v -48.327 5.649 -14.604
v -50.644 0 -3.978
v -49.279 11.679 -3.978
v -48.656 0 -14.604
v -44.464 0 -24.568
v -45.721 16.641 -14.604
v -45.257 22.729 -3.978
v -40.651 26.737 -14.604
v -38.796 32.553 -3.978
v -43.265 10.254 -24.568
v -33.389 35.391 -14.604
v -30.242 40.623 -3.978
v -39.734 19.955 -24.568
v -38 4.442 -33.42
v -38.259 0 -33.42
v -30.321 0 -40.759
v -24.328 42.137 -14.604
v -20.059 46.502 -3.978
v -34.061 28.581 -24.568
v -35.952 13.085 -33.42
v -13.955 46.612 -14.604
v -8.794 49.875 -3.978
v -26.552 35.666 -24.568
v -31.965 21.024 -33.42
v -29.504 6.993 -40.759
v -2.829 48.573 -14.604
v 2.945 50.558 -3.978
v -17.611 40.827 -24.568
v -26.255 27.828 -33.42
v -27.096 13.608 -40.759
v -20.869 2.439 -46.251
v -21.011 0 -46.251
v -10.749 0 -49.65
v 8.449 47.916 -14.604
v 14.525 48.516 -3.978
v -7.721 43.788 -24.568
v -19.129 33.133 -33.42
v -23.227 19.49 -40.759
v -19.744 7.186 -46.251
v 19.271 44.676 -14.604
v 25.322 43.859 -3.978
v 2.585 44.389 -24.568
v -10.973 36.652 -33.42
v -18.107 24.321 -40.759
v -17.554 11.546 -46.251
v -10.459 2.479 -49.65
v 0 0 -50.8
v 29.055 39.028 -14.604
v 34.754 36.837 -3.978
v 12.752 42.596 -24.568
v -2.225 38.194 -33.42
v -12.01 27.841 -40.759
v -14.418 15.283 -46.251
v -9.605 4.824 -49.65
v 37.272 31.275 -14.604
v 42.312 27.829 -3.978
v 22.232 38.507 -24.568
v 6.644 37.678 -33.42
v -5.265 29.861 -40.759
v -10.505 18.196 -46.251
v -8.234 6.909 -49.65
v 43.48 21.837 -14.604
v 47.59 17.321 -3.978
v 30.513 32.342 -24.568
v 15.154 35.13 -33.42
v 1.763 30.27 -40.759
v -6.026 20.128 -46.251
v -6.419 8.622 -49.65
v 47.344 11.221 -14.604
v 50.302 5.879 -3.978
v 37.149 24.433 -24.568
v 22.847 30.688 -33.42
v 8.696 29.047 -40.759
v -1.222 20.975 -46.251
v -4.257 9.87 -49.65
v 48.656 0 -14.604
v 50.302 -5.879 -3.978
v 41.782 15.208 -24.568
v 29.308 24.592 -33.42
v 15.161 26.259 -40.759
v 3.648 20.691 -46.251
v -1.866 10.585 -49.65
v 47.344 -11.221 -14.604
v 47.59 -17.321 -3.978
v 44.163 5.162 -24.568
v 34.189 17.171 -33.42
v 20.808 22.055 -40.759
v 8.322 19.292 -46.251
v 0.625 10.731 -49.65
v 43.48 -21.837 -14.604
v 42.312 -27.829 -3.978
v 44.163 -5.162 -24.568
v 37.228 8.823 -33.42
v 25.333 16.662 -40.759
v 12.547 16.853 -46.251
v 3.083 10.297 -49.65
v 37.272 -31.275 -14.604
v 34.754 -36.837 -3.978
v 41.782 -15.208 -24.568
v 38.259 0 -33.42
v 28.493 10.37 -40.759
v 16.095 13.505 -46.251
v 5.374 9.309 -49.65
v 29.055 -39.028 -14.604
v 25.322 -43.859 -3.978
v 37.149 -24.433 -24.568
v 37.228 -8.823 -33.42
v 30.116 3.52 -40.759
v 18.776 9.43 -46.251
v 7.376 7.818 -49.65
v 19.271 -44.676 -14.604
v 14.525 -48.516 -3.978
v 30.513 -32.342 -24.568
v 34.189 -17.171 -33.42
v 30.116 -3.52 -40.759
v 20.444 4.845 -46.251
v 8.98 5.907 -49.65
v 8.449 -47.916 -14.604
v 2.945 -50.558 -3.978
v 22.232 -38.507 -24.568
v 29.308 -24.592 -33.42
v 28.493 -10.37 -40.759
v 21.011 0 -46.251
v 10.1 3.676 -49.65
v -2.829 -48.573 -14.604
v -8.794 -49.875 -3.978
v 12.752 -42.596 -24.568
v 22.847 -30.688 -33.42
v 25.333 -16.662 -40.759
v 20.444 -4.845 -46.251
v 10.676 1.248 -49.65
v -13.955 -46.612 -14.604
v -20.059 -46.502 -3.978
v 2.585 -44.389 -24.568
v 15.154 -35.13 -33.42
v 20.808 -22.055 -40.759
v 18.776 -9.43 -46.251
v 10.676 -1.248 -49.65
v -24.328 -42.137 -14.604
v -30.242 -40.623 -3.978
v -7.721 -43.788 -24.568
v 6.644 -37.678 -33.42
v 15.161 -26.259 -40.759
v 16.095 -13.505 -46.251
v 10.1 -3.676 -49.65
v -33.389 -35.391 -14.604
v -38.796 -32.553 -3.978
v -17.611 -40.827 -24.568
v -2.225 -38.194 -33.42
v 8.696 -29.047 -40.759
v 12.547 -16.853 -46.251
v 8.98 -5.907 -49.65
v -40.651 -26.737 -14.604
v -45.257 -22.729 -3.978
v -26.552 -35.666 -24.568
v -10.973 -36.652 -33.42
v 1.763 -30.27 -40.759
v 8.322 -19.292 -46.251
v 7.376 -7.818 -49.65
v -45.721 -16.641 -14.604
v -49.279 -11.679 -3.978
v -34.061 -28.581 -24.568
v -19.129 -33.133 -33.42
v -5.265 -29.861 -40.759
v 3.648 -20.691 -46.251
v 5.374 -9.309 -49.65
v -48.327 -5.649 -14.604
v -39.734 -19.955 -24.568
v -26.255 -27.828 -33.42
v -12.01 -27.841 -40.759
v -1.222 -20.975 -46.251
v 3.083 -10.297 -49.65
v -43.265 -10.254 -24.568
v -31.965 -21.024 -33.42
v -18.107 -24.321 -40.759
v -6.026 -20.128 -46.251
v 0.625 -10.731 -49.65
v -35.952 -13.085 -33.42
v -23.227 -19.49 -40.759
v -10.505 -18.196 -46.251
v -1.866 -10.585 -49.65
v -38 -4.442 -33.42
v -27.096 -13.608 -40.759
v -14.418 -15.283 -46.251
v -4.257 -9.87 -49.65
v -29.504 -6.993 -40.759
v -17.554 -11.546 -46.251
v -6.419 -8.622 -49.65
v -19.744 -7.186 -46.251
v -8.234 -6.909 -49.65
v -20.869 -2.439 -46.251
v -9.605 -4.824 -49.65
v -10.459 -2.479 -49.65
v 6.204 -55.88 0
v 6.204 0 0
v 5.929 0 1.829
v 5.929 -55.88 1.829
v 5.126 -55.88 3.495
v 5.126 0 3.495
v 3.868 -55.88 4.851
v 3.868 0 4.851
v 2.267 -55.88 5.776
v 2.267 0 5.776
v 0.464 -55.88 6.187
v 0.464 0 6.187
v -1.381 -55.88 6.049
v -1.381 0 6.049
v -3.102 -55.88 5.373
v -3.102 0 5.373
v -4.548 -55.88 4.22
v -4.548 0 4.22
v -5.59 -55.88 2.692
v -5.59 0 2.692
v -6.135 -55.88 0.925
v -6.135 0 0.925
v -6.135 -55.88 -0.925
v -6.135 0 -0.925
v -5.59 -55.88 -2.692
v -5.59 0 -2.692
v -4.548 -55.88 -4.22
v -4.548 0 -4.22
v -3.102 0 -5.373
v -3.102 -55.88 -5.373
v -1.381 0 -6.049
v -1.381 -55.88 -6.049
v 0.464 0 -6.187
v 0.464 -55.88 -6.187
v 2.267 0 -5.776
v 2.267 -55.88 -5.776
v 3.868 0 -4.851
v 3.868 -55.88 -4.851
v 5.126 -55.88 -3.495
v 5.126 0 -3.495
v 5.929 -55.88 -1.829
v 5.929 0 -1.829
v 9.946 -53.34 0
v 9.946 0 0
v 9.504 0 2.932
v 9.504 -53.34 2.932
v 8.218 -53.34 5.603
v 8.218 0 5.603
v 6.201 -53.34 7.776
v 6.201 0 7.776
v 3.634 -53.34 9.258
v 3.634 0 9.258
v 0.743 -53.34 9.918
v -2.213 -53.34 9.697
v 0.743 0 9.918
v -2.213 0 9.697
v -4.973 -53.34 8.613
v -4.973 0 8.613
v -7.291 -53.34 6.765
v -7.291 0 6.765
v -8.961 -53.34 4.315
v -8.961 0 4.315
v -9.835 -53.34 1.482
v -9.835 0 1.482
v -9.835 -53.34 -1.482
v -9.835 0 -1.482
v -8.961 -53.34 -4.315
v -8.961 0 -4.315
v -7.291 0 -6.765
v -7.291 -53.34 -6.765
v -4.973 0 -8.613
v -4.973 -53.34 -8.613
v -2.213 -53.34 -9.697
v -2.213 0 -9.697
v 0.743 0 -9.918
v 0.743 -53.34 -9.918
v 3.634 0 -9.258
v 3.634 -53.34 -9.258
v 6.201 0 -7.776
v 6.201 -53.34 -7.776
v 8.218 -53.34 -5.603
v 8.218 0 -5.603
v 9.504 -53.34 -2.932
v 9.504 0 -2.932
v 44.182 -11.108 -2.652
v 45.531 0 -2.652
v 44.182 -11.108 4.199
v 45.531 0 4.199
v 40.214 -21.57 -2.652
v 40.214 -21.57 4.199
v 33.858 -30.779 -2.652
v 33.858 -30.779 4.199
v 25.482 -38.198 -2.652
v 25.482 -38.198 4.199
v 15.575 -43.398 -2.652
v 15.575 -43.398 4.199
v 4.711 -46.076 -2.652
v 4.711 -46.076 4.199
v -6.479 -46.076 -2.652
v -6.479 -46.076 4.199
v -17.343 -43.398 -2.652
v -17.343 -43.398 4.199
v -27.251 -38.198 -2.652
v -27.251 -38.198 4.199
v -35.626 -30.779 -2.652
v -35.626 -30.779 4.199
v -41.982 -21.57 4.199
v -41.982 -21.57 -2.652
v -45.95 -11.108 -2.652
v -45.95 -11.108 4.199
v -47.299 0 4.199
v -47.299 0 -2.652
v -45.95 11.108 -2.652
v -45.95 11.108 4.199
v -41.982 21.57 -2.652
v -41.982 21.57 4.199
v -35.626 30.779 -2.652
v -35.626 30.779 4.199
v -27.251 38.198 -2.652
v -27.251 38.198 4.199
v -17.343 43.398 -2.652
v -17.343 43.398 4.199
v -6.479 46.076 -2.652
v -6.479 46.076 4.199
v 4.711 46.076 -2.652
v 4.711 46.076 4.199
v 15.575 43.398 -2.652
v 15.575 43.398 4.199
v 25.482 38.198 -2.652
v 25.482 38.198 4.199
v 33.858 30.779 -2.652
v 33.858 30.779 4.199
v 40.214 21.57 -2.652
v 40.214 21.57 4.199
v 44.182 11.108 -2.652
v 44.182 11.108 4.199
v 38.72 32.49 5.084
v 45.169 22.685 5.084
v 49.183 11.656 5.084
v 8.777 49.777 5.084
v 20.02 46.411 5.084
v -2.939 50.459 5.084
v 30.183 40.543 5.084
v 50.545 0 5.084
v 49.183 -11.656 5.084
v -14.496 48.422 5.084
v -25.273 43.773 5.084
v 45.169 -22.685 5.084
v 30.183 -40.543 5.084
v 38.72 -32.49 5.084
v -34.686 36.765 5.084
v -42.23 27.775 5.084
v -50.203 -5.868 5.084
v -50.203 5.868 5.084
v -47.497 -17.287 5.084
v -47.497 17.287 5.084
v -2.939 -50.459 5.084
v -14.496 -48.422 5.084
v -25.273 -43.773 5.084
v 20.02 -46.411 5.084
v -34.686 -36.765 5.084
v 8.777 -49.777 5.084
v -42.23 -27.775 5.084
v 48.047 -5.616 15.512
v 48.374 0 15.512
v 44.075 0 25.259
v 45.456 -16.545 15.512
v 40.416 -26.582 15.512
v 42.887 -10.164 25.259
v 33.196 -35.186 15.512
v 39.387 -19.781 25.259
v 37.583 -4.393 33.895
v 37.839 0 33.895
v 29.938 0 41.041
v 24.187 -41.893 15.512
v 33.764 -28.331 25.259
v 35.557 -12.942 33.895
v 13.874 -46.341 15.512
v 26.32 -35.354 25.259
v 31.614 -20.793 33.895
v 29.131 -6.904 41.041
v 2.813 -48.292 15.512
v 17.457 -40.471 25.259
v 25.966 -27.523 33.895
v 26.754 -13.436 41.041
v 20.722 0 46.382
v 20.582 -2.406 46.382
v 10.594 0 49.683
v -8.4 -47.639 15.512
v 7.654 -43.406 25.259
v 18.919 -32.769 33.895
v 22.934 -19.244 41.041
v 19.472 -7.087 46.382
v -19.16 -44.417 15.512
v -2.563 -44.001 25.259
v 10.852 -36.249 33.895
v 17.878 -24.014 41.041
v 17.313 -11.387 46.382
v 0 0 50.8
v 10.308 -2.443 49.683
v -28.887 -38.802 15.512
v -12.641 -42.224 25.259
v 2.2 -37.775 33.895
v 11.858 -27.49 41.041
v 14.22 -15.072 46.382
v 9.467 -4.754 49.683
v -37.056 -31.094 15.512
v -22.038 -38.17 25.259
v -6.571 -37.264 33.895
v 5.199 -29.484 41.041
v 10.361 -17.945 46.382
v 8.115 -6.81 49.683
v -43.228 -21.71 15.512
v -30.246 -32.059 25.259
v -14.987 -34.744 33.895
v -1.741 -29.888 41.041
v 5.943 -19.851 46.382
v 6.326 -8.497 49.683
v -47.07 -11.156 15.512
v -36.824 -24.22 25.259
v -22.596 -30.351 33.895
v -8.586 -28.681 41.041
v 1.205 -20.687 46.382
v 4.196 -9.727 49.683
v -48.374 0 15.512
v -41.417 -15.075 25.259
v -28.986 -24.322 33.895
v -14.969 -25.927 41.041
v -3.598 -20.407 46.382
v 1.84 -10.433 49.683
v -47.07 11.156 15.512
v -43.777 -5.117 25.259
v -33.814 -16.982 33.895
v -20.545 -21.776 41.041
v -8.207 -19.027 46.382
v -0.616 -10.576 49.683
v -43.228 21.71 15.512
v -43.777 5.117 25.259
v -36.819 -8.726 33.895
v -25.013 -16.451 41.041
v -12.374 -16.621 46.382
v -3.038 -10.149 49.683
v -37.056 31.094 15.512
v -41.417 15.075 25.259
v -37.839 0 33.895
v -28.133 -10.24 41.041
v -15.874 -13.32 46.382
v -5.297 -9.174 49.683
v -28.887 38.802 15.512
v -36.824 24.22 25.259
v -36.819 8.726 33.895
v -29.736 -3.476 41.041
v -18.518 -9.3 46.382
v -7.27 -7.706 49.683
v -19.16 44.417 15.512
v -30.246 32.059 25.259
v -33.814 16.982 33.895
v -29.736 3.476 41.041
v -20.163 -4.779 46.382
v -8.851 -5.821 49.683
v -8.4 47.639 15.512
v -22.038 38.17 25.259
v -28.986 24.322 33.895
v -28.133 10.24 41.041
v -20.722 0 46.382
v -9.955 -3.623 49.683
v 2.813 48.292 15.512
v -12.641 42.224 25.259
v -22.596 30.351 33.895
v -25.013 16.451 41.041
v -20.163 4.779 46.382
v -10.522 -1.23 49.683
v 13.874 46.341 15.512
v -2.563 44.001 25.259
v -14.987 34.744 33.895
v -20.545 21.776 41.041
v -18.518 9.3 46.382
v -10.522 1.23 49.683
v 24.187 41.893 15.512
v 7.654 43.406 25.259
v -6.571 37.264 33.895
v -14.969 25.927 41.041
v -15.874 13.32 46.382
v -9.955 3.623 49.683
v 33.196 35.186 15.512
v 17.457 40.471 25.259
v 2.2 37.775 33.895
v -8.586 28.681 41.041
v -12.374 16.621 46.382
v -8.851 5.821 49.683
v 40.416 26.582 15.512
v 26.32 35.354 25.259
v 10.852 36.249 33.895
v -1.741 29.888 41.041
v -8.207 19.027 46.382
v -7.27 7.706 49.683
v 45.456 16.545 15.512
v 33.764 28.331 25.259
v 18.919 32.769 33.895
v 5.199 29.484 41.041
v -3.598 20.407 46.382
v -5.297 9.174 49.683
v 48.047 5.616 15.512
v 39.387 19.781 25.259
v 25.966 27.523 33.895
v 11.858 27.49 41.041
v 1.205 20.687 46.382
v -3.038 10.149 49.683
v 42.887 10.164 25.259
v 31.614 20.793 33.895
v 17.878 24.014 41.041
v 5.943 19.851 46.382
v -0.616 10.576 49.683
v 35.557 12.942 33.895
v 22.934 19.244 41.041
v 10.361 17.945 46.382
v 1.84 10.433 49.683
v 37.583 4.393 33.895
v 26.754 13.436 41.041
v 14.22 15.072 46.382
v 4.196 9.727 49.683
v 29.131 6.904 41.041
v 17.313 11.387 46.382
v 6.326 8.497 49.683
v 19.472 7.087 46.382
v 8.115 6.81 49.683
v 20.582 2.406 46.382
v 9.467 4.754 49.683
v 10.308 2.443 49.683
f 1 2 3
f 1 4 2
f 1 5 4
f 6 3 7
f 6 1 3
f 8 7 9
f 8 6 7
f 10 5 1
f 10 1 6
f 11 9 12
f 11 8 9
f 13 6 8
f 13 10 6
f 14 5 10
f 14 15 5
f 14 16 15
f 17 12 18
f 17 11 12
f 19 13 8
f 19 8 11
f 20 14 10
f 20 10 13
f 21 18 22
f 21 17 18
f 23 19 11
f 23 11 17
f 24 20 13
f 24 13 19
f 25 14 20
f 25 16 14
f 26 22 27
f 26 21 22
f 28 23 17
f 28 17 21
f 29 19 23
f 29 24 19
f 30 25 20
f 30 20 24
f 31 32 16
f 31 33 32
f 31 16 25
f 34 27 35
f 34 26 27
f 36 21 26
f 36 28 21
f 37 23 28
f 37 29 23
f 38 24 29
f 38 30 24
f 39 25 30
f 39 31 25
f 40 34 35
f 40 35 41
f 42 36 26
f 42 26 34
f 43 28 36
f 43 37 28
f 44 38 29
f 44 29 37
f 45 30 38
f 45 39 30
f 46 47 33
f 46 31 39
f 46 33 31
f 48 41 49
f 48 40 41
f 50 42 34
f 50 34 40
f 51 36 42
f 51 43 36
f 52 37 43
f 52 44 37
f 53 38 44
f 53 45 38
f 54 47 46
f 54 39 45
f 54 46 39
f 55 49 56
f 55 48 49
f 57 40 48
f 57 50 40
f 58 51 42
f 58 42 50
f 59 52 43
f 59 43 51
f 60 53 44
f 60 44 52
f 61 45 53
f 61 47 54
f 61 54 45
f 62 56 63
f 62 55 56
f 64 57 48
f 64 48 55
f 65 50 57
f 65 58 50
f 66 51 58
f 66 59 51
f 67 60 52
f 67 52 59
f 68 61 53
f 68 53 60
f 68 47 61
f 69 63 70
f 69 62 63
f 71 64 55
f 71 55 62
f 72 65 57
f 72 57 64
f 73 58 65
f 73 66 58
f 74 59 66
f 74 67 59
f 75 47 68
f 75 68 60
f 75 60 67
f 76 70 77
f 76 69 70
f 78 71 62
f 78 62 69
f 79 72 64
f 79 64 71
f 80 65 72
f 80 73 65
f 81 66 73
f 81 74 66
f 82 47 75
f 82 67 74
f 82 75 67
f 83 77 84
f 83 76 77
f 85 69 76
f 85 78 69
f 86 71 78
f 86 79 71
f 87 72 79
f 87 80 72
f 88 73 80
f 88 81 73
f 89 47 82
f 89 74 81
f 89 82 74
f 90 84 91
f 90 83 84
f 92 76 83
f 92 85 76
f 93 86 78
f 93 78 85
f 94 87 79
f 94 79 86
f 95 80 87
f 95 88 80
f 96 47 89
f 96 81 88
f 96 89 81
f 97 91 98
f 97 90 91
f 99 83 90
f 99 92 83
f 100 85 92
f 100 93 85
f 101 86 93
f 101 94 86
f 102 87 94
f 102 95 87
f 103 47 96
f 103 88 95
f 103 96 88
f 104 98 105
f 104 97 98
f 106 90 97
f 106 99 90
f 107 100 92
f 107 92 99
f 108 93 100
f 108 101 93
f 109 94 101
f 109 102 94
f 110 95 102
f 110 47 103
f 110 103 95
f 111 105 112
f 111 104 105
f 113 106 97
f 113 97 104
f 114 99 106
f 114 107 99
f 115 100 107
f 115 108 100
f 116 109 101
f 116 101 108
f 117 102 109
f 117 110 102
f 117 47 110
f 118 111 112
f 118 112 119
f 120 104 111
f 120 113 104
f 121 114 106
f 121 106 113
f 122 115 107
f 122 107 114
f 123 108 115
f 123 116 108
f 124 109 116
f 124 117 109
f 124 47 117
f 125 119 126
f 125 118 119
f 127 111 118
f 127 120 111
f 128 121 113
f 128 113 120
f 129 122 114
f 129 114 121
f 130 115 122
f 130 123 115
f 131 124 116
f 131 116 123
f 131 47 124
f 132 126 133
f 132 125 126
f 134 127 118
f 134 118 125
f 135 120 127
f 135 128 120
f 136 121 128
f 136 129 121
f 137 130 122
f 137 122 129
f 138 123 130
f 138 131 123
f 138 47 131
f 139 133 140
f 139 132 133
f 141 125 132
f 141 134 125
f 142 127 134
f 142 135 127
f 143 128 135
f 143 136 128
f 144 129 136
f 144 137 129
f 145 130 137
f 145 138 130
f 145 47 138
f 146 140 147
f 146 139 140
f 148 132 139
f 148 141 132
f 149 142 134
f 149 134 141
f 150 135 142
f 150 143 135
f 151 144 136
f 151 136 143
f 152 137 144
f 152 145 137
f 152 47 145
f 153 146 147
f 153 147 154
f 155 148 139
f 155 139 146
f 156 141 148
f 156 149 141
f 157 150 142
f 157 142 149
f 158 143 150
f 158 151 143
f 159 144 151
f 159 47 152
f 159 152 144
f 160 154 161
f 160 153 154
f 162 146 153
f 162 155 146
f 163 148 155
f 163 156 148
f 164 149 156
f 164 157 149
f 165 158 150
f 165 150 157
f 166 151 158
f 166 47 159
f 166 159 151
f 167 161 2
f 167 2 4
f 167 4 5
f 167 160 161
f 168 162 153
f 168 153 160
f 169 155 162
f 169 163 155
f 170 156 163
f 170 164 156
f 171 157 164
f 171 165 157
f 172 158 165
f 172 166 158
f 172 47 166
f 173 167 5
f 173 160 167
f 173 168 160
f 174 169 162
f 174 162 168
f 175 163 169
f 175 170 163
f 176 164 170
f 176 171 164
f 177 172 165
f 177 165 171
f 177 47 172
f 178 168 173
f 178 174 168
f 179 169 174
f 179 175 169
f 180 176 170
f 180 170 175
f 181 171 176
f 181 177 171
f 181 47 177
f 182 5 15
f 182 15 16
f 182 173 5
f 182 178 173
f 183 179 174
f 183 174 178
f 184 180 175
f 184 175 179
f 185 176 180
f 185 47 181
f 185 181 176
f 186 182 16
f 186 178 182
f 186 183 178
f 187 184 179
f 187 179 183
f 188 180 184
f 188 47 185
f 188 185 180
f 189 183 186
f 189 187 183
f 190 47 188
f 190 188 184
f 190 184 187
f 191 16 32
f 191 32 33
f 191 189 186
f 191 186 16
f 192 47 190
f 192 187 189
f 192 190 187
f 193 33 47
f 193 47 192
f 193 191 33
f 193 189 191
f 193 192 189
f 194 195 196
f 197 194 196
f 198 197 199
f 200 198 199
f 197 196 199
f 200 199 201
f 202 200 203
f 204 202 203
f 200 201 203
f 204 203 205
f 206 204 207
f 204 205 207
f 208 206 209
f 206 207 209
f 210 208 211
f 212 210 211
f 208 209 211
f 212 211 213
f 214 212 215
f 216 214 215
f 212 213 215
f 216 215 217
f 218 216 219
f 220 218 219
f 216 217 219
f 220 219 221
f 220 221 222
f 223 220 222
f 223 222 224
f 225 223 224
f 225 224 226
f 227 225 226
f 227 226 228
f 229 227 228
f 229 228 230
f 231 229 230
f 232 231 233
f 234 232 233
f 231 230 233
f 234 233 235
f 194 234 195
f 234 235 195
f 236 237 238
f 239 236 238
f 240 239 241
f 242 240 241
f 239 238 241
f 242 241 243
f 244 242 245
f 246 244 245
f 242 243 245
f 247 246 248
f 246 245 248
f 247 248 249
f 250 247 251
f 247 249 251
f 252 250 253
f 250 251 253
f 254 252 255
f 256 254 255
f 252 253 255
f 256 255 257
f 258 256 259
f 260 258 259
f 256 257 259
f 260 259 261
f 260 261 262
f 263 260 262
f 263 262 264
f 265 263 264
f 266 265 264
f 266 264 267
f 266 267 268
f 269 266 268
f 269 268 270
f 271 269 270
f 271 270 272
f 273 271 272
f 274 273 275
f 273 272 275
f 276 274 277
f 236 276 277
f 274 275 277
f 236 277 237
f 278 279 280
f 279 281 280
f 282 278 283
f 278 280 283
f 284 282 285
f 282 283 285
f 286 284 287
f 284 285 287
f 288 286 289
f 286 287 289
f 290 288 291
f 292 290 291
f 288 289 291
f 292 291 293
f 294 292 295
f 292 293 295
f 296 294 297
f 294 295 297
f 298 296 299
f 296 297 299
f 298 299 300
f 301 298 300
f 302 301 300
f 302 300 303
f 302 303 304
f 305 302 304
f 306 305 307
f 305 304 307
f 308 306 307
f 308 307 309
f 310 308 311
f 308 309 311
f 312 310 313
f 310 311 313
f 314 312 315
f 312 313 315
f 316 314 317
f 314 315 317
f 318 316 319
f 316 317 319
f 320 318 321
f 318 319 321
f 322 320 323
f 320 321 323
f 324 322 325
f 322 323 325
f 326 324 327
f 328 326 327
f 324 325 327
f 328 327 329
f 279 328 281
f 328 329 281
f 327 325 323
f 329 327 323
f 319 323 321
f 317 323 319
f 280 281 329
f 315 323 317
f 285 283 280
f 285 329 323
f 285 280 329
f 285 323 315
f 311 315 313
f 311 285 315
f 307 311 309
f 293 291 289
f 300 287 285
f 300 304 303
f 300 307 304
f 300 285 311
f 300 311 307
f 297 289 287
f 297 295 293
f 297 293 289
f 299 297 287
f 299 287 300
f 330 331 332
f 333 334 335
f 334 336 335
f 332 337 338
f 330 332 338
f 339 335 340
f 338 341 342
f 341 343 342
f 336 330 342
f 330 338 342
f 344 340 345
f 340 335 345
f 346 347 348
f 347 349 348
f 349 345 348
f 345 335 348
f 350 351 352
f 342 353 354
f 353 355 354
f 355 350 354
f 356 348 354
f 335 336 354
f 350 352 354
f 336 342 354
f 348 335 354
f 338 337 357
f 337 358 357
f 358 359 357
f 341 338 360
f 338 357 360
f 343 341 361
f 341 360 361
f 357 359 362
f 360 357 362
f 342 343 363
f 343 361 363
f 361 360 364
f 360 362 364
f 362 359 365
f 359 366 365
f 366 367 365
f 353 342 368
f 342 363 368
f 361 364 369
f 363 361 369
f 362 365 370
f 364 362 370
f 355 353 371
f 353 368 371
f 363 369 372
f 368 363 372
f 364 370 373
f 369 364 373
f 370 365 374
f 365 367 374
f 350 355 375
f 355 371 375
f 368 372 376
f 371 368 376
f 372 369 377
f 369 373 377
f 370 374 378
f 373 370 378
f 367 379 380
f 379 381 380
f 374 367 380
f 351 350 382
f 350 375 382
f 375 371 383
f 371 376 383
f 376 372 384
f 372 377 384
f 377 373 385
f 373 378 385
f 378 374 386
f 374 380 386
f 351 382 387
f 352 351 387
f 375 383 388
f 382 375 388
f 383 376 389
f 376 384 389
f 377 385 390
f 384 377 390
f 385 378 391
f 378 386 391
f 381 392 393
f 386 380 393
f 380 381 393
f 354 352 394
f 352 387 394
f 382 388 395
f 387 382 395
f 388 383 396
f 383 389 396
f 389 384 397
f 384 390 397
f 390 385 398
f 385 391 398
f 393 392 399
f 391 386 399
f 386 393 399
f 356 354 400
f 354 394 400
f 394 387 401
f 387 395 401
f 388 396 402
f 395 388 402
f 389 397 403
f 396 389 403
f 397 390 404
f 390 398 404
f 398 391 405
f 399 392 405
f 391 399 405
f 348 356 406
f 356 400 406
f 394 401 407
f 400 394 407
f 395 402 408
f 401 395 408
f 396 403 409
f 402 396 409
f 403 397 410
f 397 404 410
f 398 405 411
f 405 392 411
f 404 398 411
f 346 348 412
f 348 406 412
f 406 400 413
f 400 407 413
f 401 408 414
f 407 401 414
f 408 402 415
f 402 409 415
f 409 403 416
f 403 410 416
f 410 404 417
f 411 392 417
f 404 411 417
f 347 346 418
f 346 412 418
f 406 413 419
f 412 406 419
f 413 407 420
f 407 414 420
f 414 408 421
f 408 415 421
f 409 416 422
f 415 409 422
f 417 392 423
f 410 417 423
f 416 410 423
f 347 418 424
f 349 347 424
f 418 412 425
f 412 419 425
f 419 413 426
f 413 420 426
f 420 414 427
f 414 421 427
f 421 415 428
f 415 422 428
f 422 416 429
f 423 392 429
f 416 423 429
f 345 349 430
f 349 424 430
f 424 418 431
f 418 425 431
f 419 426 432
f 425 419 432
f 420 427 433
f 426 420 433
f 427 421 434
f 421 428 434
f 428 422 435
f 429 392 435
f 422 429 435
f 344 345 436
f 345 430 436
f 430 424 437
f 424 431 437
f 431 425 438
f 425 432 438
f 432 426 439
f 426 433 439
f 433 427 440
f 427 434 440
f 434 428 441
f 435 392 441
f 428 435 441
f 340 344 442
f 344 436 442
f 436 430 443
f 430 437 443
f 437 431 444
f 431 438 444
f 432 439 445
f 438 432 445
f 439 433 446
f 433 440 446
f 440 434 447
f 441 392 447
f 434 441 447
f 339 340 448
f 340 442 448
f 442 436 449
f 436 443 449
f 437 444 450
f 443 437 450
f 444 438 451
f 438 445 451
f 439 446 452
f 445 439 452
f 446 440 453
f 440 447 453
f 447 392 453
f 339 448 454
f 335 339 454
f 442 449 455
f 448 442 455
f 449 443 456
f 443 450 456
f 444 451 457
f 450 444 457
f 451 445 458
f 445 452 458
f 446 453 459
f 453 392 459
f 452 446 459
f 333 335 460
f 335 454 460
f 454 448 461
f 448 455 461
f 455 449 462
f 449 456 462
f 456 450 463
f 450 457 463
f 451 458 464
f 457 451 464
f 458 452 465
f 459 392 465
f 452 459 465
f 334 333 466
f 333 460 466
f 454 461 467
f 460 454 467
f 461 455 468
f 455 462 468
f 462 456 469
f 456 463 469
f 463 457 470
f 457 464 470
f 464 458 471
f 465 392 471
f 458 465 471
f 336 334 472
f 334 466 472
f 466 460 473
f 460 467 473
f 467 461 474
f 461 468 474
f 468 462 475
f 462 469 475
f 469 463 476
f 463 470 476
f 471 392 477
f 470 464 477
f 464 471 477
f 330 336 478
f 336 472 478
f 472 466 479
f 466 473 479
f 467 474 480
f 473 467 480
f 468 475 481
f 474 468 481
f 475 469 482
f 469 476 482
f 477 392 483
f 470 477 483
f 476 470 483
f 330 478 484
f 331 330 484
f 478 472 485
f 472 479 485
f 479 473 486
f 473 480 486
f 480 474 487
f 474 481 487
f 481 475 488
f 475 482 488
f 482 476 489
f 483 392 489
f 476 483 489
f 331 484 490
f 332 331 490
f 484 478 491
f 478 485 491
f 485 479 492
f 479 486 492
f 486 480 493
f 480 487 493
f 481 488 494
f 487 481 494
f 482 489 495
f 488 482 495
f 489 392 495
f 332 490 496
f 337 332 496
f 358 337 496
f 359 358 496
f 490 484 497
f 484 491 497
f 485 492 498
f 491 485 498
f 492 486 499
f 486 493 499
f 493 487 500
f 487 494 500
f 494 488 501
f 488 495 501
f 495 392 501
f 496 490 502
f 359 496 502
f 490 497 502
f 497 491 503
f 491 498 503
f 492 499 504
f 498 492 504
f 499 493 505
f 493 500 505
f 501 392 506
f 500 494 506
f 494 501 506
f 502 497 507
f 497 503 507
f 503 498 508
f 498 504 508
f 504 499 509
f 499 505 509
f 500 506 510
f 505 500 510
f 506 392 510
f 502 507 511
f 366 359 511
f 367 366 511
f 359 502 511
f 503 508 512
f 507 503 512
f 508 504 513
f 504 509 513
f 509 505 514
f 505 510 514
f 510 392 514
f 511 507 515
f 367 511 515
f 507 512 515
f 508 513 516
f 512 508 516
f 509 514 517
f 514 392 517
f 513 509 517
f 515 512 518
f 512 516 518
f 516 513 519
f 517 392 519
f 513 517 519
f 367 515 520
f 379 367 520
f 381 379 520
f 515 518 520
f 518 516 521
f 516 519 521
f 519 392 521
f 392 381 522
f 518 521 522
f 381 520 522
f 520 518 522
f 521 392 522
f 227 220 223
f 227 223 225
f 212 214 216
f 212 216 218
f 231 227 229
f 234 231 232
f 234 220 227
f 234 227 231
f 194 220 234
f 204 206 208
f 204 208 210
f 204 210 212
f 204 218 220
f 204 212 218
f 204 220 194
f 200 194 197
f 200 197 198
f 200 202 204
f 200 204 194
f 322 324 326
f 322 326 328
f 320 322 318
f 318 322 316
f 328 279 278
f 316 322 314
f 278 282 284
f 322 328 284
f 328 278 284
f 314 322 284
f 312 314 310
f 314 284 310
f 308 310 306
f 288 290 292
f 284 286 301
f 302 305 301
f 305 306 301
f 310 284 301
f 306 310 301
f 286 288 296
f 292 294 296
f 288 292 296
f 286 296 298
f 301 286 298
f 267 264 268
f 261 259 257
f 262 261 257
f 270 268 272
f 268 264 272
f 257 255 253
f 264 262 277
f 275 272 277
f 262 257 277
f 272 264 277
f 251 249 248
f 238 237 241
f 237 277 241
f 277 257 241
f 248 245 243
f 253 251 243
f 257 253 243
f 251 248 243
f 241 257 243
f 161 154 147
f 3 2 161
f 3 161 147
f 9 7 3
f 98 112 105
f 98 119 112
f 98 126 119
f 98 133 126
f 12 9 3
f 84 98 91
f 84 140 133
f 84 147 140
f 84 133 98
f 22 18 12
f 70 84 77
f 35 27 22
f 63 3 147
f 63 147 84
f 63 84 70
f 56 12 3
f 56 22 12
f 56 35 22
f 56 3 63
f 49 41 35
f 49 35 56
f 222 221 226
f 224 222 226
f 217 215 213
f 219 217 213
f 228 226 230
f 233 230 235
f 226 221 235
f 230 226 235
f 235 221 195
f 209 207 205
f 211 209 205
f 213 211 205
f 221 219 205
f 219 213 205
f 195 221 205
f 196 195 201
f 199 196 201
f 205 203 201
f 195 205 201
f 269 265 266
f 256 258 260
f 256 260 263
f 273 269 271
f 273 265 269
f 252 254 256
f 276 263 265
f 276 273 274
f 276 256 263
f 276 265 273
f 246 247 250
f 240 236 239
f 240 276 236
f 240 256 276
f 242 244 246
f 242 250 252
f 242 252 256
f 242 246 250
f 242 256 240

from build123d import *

# Parameters (mm, degrees)
F2_W     = 46.4146398008
F2_H     = 6.8516854662
F4_R     = 9.945994243
F6_DEPTH = 53.34
F5_R     = 6.2043861282
F7_DEPTH = 55.88


with BuildPart() as f1:
    # F0 (on Front) → F1 (revolve)
    with BuildSketch(Plane.XZ):
        with BuildLine():
            Line((0, 5.0835083239), (50.5450090822, 5.0835083239))
            ThreePointArc((50.5450090822, 5.0835083239), (34.0763684769, 37.6754709516), (0, 50.8))
            Line((0, 50.8), (0, 5.0835083239))
        make_face()
    revolve(axis=Axis((0, 0, -1.7681755126), (0, 0, -1)))


with BuildPart() as f1b:
    # F0 (on Front) → F1, piece 2 (revolve)
    with BuildSketch(Plane.XZ):
        with BuildLine():
            ThreePointArc((-50.6439764608, -3.9783976972), (-34.4857753065, -37.3010898166), (0, -50.8))
            Line((0, -50.8), (0, -3.9783976972))
            Line((0, -3.9783976972), (-50.6439764608, -3.9783976972))
        make_face()
    revolve(axis=Axis((0, 0, -1.7681755126), (0, 0, -1)))


with BuildPart() as f3:
    # F2 (on Front) → F3 (revolve)
    with BuildSketch(Plane.XZ):
        with Locations((22.3232302815, 0.7735773688)):
            Rectangle(F2_W, F2_H)
    revolve(axis=Axis((-0.8840896189, 0, 0.7735773688), (0, 0, -1)))


with BuildPart() as f6:
    # F4 (on Front) → F6 (new body)
    with BuildSketch(Plane.XZ):
        Circle(F4_R)
    extrude(amount=F6_DEPTH)


with BuildPart() as f7:
    # F5 (on Front) → F7 (new body)
    with BuildSketch(Plane.XZ):
        Circle(F5_R)
    extrude(amount=F7_DEPTH)


solid = Compound([f1.part, f1b.part, f3.part, f6.part, f7.part])
